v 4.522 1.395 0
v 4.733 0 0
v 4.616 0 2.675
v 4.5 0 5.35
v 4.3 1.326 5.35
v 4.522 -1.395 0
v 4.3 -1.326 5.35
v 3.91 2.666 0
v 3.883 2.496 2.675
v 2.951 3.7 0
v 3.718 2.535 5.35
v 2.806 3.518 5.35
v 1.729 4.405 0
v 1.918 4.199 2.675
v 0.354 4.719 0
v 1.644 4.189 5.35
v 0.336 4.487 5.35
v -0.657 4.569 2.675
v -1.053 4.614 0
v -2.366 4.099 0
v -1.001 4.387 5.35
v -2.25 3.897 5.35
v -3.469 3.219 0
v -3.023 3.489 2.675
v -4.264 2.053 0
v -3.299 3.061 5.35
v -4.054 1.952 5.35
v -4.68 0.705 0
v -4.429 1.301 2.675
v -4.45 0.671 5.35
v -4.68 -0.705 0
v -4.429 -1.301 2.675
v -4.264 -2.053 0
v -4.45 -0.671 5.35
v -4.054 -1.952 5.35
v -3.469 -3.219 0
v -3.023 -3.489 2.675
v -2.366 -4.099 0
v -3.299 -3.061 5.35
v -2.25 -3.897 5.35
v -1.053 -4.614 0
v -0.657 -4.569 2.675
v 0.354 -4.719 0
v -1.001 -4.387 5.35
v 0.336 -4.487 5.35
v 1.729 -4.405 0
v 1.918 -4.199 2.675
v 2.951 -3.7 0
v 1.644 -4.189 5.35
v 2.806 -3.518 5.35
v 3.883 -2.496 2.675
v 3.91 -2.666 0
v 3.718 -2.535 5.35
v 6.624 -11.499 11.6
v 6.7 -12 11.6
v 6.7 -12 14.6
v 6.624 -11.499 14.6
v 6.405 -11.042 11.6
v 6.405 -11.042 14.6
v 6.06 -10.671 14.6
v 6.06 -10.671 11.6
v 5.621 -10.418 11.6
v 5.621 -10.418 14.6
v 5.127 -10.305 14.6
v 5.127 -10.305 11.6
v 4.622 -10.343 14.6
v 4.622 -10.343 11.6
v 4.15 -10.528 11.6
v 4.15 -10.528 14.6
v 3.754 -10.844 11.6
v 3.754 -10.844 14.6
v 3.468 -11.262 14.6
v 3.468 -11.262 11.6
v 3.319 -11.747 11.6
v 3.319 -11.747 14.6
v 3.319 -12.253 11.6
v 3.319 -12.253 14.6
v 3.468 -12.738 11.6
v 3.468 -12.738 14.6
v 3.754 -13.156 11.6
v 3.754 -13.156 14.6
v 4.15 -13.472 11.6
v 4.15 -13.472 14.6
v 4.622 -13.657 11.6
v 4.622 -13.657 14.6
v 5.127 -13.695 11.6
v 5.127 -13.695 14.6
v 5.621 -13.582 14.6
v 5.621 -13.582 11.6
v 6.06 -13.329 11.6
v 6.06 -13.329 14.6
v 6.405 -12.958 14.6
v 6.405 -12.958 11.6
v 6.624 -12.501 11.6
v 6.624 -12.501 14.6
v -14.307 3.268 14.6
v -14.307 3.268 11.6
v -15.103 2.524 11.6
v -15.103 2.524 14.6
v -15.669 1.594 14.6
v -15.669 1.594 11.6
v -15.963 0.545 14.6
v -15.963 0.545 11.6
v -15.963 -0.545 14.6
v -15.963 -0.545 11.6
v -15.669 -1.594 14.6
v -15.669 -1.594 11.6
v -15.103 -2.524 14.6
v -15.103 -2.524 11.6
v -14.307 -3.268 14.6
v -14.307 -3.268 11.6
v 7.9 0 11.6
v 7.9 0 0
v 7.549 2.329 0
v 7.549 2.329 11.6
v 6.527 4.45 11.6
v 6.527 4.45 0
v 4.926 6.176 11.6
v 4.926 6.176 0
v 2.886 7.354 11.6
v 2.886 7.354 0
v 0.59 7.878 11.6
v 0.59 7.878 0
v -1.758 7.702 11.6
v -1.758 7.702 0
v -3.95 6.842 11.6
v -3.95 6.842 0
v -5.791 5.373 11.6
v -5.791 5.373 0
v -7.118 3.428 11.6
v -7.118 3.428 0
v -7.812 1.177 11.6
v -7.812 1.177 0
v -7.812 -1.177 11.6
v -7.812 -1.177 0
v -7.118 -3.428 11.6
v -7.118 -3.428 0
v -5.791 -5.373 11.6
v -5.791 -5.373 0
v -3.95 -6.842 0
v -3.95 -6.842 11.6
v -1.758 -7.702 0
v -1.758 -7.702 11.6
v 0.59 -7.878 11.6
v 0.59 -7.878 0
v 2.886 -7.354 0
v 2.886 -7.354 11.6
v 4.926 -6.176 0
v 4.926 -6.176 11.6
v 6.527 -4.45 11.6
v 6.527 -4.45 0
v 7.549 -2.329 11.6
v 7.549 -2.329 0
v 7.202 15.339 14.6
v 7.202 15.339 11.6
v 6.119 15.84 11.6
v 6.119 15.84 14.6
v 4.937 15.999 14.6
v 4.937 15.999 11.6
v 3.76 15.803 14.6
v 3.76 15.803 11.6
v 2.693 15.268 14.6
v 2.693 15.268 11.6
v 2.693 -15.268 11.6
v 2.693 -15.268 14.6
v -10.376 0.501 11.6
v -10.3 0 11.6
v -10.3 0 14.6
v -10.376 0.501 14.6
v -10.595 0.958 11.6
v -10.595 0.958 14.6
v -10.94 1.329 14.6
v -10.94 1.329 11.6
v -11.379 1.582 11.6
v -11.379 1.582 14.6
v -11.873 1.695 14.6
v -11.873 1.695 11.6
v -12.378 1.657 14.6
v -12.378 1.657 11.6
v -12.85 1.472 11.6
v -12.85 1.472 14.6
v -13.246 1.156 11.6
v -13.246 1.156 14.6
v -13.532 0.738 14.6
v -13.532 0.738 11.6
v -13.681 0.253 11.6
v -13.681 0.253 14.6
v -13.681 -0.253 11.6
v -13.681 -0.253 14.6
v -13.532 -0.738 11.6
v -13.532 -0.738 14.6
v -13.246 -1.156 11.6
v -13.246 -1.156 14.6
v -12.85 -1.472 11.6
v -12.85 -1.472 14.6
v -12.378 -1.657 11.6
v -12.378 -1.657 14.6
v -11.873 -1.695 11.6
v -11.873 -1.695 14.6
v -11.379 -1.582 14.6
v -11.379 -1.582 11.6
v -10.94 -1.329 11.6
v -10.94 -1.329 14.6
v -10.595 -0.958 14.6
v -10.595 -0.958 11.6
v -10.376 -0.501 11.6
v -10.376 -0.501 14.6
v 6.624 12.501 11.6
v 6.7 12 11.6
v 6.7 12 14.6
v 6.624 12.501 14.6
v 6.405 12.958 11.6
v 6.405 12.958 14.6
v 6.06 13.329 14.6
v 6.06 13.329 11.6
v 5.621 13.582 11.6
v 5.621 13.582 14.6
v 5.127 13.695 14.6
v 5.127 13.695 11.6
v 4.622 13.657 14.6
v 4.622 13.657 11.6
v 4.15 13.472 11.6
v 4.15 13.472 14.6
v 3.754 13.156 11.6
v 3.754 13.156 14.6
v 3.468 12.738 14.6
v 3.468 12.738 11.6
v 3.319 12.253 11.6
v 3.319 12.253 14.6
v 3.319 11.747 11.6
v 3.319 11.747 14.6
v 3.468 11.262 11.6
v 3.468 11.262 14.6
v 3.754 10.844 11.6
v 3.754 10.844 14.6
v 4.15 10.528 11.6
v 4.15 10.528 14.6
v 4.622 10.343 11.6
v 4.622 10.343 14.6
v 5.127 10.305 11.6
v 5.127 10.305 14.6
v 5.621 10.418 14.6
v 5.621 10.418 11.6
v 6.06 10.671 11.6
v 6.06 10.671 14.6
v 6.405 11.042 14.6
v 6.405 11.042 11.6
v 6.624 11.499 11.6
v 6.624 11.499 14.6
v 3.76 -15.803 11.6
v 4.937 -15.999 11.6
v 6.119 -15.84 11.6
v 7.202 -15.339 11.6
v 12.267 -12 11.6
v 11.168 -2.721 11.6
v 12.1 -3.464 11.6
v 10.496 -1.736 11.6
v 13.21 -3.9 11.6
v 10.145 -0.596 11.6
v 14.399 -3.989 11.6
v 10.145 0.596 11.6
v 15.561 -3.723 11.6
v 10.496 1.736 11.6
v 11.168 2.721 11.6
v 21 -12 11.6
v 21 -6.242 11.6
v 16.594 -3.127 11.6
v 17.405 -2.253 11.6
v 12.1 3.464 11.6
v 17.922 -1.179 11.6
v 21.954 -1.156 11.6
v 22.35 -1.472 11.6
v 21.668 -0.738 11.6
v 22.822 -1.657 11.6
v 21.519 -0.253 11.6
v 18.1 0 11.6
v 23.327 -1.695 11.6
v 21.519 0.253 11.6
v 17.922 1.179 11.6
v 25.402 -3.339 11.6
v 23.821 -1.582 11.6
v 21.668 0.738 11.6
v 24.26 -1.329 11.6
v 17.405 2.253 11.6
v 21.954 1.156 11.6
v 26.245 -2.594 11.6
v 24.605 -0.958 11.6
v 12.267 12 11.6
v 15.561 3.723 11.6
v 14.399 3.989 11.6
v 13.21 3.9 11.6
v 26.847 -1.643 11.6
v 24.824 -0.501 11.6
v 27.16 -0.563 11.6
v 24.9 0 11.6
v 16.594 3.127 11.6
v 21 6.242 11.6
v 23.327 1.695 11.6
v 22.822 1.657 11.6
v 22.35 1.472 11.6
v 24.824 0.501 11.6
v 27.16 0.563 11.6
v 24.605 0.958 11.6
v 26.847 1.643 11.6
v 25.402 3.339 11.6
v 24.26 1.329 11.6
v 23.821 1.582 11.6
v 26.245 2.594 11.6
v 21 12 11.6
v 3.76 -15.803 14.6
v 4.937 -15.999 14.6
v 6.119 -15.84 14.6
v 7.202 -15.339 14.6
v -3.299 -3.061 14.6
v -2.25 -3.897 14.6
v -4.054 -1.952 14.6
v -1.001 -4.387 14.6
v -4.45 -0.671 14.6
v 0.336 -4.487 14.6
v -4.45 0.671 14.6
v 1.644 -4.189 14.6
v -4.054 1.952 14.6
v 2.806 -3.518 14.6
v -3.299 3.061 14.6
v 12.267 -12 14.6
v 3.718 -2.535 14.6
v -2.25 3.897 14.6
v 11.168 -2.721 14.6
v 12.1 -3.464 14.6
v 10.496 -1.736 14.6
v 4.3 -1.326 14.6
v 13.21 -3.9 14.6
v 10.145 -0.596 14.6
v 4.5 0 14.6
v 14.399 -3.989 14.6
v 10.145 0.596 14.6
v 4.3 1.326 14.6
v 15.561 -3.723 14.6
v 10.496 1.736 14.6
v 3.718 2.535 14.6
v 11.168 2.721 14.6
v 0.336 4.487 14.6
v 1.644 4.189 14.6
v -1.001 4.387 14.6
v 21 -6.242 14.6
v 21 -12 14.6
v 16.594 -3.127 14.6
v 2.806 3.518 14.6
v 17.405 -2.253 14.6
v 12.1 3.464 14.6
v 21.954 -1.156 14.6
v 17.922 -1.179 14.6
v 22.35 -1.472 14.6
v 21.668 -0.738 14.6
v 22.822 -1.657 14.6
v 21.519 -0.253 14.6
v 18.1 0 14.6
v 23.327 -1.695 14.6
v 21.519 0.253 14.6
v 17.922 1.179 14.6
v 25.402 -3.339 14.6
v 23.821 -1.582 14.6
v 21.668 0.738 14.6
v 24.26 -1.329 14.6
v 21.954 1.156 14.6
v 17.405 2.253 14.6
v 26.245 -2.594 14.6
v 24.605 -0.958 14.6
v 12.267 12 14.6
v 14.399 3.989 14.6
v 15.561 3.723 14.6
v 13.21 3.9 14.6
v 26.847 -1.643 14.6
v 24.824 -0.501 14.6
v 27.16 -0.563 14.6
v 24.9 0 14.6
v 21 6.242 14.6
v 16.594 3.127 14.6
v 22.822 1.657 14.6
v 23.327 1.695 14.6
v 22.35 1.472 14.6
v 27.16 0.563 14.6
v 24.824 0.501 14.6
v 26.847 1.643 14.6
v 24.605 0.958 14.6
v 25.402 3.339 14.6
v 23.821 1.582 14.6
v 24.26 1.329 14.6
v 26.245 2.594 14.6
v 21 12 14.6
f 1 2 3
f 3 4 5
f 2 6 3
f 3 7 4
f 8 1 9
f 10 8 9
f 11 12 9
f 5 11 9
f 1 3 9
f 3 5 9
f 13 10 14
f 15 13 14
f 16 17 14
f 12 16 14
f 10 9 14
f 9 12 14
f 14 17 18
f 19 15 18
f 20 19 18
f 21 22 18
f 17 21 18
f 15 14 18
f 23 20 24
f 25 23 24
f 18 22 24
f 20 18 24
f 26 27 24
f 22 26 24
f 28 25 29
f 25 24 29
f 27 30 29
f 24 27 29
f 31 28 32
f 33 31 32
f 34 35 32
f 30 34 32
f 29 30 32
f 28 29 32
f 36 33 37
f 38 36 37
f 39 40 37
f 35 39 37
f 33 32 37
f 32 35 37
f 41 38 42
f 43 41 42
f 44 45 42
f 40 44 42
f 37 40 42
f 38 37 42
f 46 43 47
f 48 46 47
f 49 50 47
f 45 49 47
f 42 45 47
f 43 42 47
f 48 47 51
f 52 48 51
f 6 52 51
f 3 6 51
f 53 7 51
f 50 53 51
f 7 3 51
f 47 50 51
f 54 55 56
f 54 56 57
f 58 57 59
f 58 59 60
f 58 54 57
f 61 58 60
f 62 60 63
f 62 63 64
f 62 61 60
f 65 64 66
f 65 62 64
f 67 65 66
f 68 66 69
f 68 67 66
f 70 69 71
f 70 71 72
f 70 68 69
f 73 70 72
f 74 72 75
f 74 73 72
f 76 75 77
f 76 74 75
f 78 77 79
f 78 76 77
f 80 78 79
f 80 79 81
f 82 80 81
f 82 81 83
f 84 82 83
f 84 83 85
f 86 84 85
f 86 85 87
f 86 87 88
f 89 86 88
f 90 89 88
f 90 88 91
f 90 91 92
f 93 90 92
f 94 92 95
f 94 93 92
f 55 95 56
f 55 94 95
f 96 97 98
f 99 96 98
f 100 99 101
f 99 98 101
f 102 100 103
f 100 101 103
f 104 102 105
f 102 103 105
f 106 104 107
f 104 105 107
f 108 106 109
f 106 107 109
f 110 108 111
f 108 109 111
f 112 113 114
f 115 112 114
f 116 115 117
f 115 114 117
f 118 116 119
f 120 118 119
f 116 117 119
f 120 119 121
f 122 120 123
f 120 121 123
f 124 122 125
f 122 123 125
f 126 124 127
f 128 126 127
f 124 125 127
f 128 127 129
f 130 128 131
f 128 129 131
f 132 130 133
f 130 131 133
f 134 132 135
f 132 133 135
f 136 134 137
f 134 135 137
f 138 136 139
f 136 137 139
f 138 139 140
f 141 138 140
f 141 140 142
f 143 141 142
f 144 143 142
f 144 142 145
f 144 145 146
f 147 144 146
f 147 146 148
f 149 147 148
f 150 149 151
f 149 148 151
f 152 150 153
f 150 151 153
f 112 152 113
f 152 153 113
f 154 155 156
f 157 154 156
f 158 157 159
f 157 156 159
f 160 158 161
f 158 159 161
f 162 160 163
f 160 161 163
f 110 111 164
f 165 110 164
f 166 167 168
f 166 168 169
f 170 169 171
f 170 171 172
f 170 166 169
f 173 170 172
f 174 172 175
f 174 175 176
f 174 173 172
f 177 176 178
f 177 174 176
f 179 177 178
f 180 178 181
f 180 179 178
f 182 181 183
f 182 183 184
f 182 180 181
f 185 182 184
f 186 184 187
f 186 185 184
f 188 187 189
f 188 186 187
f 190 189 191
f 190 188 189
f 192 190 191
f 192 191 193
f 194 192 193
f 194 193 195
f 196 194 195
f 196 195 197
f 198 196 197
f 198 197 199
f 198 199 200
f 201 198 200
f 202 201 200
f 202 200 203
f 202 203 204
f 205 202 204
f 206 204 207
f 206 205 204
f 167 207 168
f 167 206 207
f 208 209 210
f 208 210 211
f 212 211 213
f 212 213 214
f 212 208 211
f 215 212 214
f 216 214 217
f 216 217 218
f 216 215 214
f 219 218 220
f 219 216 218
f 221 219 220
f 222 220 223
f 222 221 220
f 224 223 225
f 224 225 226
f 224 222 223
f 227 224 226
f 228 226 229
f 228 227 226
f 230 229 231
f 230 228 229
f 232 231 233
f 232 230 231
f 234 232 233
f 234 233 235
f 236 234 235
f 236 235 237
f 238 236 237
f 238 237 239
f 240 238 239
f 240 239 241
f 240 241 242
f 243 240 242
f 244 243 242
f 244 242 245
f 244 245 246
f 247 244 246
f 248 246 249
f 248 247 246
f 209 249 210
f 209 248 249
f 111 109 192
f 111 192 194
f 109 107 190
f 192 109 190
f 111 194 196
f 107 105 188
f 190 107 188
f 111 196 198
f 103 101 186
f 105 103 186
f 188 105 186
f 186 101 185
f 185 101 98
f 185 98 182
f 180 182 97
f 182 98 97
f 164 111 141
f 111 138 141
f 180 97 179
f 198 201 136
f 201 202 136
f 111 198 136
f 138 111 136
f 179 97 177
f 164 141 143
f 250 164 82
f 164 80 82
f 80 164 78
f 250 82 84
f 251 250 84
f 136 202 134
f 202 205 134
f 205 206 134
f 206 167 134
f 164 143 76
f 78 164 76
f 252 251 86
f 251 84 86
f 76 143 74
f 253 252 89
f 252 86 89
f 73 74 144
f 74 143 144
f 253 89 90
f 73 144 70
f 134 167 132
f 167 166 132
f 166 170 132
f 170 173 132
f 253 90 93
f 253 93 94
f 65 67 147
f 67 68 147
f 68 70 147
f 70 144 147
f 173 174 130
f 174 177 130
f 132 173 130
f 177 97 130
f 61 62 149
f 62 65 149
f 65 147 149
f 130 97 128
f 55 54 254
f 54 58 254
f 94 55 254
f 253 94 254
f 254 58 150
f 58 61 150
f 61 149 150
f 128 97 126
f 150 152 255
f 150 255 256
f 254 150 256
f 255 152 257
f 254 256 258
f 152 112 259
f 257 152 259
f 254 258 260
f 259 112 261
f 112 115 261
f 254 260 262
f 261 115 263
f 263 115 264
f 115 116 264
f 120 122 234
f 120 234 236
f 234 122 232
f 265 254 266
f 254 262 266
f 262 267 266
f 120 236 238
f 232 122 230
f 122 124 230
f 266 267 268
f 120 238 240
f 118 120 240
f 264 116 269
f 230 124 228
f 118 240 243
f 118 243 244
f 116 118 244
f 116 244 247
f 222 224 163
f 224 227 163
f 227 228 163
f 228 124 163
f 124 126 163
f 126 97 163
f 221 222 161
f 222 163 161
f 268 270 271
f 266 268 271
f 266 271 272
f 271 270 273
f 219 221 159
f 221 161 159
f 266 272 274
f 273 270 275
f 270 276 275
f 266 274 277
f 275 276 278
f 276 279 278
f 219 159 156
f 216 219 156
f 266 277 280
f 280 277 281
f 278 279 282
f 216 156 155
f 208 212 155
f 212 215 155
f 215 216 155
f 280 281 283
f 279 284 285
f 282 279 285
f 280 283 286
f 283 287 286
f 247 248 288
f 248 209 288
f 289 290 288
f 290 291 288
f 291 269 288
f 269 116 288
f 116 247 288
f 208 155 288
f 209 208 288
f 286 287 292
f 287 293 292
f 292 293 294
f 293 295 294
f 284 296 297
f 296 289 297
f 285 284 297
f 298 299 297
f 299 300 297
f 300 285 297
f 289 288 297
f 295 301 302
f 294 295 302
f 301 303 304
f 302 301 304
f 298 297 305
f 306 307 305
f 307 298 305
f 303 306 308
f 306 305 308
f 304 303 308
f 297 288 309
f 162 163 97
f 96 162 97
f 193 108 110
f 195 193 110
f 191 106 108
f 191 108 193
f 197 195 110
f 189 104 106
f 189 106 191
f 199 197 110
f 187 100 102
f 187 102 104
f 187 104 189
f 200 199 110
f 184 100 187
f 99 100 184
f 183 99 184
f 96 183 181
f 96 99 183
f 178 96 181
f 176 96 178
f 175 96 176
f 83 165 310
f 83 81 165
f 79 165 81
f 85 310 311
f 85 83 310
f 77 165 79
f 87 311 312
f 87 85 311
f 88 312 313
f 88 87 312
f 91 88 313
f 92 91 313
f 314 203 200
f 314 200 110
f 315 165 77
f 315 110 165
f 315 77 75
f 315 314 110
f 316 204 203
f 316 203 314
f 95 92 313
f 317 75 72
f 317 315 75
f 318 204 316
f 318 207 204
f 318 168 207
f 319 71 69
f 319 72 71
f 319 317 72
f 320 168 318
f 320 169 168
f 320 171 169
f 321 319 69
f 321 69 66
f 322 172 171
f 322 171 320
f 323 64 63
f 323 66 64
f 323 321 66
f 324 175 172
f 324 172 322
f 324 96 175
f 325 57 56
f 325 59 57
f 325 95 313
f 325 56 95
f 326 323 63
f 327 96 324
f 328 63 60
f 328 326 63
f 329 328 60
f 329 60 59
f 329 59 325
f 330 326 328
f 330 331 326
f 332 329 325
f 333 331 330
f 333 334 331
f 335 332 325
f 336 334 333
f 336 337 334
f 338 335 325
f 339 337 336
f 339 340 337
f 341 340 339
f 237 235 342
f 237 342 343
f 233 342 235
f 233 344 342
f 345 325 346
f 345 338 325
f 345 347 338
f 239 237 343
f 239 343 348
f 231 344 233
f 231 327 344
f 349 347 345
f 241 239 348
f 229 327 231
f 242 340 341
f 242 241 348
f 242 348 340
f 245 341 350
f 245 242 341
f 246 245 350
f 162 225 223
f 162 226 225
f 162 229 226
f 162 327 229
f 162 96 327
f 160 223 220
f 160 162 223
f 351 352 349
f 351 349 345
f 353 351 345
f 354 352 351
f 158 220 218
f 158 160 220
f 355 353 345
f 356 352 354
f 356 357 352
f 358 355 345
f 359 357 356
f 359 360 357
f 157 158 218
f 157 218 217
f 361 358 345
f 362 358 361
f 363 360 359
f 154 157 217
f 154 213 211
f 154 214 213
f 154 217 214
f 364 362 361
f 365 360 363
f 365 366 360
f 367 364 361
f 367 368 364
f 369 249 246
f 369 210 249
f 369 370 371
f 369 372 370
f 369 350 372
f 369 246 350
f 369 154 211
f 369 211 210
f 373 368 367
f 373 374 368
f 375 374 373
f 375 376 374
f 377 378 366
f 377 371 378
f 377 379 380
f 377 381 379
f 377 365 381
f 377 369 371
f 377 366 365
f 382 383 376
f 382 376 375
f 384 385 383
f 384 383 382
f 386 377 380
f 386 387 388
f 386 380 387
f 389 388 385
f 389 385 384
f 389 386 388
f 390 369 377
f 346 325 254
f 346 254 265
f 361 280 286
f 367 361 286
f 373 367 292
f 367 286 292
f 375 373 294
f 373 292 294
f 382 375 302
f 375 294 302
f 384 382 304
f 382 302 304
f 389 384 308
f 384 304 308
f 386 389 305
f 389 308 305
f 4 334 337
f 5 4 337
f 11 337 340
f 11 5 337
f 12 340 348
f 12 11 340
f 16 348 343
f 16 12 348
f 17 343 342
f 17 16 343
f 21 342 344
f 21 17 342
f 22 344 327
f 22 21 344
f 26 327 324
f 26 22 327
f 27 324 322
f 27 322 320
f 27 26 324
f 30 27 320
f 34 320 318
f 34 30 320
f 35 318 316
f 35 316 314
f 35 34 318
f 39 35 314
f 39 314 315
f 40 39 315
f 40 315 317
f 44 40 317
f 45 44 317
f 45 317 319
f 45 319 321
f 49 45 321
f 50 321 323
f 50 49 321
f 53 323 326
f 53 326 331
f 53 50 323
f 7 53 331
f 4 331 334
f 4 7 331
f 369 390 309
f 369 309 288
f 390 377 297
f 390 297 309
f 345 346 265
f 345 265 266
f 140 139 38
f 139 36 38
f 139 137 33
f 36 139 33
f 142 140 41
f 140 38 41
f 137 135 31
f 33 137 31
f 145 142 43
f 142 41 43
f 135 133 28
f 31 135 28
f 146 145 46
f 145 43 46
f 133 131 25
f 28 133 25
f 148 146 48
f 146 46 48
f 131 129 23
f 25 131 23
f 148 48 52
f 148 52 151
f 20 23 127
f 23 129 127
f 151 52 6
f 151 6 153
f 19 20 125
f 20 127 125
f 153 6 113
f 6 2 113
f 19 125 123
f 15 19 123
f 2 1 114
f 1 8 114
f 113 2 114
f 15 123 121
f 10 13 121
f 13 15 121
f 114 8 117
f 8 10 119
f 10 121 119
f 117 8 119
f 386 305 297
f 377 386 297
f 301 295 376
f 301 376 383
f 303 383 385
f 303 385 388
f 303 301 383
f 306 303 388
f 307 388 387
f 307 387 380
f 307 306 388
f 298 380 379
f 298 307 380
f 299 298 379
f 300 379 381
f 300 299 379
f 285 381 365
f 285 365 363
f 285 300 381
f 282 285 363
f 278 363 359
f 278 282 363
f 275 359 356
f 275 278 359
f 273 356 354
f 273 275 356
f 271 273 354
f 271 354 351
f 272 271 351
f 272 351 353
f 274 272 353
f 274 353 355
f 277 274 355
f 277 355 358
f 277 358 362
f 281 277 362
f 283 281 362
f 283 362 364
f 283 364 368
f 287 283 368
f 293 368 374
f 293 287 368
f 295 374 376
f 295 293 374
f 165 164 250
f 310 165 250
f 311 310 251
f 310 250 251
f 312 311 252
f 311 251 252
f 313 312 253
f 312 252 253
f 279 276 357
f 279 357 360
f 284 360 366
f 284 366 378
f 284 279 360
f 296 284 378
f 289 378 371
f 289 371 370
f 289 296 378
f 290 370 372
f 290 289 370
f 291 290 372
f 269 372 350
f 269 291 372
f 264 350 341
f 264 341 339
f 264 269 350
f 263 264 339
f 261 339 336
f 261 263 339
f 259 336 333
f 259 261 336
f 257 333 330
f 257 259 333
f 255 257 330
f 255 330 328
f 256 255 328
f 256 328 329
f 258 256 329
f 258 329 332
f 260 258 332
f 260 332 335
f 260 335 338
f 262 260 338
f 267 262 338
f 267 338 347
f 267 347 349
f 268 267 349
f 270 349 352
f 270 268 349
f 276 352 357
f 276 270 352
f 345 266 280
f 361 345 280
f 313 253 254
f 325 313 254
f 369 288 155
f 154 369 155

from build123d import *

# Parameters (mm, degrees)
SZKIC1_R                    = 7.9
SZKIC1_R_2                  = 4.75
DODANIE_WYCI_GNI_CIE1_DEPTH = 11.6
DODANIE_WYCI_GNI_CIE2_START = -0.5
SZKIC2_R                    = 4.75
SZKIC2_R_2                  = 4.5
DODANIE_WYCI_GNI_CIE2_DEPTH = 0.5
SFAZOWANIE1_SIZE            = 11.5
SFAZOWANIE1_SIZE_2          = 0.5
SZKIC4_R                    = 4
SZKIC4_R_2                  = 1.7
SZKIC4_R_3                  = 4.5
DODANIE_WYCI_GNI_CIE4_DEPTH = 3
DODANIE_WYCI_GNI_CIE5_DEPTH = 3


with BuildPart() as part:
    # Szkic1 → Dodanie-wyciągnięcie1 (new body)
    with BuildSketch(Plane.XY):
        Circle(SZKIC1_R)
        Circle(SZKIC1_R_2, mode=Mode.SUBTRACT)
    extrude(amount=DODANIE_WYCI_GNI_CIE1_DEPTH)

    # Szkic2 → Dodanie-wyciągnięcie2 (add)
    with BuildSketch(Plane.XY.offset(11.6).offset(DODANIE_WYCI_GNI_CIE2_START)):
        Circle(SZKIC2_R)
        Circle(SZKIC2_R_2, mode=Mode.SUBTRACT)
    extrude(amount=DODANIE_WYCI_GNI_CIE2_DEPTH)

    # Sfazowanie1
    # the kernel refuses this chamfer: 11.5, 0.5 mm, written as the material it adds along each edge
    with BuildSketch(Plane(origin=(0, 0, 11.1), x_dir=(1, 0, 0), z_dir=(0, -1, 0))) as sfazowanie1_piece_1_section:
        Polygon((4.75, -SFAZOWANIE1_SIZE), (4.75 - SFAZOWANIE1_SIZE_2, 0), (4.75, 0), align=None)
    sfazowanie1_piece_1 = revolve(axis=Axis((0, 0, 11.1), (0, 0, 1)), mode=Mode.PRIVATE)
    sfazowanie1_piece_1 = split(sfazowanie1_piece_1, bisect_by=Plane(origin=(-4.668659179, 0, 0), z_dir=(0, 0, 1)), keep=Keep.TOP, mode=Mode.PRIVATE)
    sfazowanie1_piece_1 = sfazowanie1_piece_1 - Plane(origin=(0, 0, 2.677276297), x_dir=(1, 0, 0), z_dir=(0, 0, -1)) * Cylinder(4.5, 46, mode=Mode.PRIVATE)
    add(sfazowanie1_piece_1)

    # Szkic4 → Dodanie-wyciągnięcie4 (add)
    with BuildSketch(Plane.XY.offset(11.6)):
        with BuildLine():
            Line((2.69326721, 15.267871453), (-14.30673279, 3.267871453))
            ThreePointArc((-14.30673279, 3.267871453), (-16, 0), (-14.30673279, -3.267871453))
            Line((-14.30673279, -3.267871453), (2.69326721, -15.267871453))
            ThreePointArc((2.69326721, -15.267871453), (4.936503941, -15.999496), (7.201834862, -15.339449541))
            Line((7.201834862, -15.339449541), (25.401834862, -3.339449541))
            ThreePointArc((25.401834862, -3.339449541), (27.2, 0), (25.401834862, 3.339449541))
            Line((25.401834862, 3.339449541), (7.201834862, 15.339449541))
            ThreePointArc((7.201834862, 15.339449541), (4.936503941, 15.999496), (2.69326721, 15.267871453))
        make_face()
        with Locations((14.1, 0)):
            Circle(SZKIC4_R, mode=Mode.SUBTRACT)
        with Locations((-12, 0)):
            Circle(SZKIC4_R_2, mode=Mode.SUBTRACT)
        with Locations((5, 12)):
            Circle(SZKIC4_R_2, mode=Mode.SUBTRACT)
        with Locations((5, -12)):
            Circle(SZKIC4_R_2, mode=Mode.SUBTRACT)
        with Locations((23.2, 0)):
            Circle(SZKIC4_R_2, mode=Mode.SUBTRACT)
        Circle(SZKIC4_R_3, mode=Mode.SUBTRACT)
    extrude(amount=DODANIE_WYCI_GNI_CIE4_DEPTH)

    # Szkic5 → Dodanie-wyciągnięcie5 (add)
    with BuildSketch(Plane.XY.offset(14.6)):
        Polygon((21, -12), (21, -6.241758242), (12.266666667, -12), align=None)
        Polygon((21, 12), (12.266666667, 12), (21, 6.241758242), align=None)
    extrude(amount=-DODANIE_WYCI_GNI_CIE5_DEPTH)


solid = part.part
